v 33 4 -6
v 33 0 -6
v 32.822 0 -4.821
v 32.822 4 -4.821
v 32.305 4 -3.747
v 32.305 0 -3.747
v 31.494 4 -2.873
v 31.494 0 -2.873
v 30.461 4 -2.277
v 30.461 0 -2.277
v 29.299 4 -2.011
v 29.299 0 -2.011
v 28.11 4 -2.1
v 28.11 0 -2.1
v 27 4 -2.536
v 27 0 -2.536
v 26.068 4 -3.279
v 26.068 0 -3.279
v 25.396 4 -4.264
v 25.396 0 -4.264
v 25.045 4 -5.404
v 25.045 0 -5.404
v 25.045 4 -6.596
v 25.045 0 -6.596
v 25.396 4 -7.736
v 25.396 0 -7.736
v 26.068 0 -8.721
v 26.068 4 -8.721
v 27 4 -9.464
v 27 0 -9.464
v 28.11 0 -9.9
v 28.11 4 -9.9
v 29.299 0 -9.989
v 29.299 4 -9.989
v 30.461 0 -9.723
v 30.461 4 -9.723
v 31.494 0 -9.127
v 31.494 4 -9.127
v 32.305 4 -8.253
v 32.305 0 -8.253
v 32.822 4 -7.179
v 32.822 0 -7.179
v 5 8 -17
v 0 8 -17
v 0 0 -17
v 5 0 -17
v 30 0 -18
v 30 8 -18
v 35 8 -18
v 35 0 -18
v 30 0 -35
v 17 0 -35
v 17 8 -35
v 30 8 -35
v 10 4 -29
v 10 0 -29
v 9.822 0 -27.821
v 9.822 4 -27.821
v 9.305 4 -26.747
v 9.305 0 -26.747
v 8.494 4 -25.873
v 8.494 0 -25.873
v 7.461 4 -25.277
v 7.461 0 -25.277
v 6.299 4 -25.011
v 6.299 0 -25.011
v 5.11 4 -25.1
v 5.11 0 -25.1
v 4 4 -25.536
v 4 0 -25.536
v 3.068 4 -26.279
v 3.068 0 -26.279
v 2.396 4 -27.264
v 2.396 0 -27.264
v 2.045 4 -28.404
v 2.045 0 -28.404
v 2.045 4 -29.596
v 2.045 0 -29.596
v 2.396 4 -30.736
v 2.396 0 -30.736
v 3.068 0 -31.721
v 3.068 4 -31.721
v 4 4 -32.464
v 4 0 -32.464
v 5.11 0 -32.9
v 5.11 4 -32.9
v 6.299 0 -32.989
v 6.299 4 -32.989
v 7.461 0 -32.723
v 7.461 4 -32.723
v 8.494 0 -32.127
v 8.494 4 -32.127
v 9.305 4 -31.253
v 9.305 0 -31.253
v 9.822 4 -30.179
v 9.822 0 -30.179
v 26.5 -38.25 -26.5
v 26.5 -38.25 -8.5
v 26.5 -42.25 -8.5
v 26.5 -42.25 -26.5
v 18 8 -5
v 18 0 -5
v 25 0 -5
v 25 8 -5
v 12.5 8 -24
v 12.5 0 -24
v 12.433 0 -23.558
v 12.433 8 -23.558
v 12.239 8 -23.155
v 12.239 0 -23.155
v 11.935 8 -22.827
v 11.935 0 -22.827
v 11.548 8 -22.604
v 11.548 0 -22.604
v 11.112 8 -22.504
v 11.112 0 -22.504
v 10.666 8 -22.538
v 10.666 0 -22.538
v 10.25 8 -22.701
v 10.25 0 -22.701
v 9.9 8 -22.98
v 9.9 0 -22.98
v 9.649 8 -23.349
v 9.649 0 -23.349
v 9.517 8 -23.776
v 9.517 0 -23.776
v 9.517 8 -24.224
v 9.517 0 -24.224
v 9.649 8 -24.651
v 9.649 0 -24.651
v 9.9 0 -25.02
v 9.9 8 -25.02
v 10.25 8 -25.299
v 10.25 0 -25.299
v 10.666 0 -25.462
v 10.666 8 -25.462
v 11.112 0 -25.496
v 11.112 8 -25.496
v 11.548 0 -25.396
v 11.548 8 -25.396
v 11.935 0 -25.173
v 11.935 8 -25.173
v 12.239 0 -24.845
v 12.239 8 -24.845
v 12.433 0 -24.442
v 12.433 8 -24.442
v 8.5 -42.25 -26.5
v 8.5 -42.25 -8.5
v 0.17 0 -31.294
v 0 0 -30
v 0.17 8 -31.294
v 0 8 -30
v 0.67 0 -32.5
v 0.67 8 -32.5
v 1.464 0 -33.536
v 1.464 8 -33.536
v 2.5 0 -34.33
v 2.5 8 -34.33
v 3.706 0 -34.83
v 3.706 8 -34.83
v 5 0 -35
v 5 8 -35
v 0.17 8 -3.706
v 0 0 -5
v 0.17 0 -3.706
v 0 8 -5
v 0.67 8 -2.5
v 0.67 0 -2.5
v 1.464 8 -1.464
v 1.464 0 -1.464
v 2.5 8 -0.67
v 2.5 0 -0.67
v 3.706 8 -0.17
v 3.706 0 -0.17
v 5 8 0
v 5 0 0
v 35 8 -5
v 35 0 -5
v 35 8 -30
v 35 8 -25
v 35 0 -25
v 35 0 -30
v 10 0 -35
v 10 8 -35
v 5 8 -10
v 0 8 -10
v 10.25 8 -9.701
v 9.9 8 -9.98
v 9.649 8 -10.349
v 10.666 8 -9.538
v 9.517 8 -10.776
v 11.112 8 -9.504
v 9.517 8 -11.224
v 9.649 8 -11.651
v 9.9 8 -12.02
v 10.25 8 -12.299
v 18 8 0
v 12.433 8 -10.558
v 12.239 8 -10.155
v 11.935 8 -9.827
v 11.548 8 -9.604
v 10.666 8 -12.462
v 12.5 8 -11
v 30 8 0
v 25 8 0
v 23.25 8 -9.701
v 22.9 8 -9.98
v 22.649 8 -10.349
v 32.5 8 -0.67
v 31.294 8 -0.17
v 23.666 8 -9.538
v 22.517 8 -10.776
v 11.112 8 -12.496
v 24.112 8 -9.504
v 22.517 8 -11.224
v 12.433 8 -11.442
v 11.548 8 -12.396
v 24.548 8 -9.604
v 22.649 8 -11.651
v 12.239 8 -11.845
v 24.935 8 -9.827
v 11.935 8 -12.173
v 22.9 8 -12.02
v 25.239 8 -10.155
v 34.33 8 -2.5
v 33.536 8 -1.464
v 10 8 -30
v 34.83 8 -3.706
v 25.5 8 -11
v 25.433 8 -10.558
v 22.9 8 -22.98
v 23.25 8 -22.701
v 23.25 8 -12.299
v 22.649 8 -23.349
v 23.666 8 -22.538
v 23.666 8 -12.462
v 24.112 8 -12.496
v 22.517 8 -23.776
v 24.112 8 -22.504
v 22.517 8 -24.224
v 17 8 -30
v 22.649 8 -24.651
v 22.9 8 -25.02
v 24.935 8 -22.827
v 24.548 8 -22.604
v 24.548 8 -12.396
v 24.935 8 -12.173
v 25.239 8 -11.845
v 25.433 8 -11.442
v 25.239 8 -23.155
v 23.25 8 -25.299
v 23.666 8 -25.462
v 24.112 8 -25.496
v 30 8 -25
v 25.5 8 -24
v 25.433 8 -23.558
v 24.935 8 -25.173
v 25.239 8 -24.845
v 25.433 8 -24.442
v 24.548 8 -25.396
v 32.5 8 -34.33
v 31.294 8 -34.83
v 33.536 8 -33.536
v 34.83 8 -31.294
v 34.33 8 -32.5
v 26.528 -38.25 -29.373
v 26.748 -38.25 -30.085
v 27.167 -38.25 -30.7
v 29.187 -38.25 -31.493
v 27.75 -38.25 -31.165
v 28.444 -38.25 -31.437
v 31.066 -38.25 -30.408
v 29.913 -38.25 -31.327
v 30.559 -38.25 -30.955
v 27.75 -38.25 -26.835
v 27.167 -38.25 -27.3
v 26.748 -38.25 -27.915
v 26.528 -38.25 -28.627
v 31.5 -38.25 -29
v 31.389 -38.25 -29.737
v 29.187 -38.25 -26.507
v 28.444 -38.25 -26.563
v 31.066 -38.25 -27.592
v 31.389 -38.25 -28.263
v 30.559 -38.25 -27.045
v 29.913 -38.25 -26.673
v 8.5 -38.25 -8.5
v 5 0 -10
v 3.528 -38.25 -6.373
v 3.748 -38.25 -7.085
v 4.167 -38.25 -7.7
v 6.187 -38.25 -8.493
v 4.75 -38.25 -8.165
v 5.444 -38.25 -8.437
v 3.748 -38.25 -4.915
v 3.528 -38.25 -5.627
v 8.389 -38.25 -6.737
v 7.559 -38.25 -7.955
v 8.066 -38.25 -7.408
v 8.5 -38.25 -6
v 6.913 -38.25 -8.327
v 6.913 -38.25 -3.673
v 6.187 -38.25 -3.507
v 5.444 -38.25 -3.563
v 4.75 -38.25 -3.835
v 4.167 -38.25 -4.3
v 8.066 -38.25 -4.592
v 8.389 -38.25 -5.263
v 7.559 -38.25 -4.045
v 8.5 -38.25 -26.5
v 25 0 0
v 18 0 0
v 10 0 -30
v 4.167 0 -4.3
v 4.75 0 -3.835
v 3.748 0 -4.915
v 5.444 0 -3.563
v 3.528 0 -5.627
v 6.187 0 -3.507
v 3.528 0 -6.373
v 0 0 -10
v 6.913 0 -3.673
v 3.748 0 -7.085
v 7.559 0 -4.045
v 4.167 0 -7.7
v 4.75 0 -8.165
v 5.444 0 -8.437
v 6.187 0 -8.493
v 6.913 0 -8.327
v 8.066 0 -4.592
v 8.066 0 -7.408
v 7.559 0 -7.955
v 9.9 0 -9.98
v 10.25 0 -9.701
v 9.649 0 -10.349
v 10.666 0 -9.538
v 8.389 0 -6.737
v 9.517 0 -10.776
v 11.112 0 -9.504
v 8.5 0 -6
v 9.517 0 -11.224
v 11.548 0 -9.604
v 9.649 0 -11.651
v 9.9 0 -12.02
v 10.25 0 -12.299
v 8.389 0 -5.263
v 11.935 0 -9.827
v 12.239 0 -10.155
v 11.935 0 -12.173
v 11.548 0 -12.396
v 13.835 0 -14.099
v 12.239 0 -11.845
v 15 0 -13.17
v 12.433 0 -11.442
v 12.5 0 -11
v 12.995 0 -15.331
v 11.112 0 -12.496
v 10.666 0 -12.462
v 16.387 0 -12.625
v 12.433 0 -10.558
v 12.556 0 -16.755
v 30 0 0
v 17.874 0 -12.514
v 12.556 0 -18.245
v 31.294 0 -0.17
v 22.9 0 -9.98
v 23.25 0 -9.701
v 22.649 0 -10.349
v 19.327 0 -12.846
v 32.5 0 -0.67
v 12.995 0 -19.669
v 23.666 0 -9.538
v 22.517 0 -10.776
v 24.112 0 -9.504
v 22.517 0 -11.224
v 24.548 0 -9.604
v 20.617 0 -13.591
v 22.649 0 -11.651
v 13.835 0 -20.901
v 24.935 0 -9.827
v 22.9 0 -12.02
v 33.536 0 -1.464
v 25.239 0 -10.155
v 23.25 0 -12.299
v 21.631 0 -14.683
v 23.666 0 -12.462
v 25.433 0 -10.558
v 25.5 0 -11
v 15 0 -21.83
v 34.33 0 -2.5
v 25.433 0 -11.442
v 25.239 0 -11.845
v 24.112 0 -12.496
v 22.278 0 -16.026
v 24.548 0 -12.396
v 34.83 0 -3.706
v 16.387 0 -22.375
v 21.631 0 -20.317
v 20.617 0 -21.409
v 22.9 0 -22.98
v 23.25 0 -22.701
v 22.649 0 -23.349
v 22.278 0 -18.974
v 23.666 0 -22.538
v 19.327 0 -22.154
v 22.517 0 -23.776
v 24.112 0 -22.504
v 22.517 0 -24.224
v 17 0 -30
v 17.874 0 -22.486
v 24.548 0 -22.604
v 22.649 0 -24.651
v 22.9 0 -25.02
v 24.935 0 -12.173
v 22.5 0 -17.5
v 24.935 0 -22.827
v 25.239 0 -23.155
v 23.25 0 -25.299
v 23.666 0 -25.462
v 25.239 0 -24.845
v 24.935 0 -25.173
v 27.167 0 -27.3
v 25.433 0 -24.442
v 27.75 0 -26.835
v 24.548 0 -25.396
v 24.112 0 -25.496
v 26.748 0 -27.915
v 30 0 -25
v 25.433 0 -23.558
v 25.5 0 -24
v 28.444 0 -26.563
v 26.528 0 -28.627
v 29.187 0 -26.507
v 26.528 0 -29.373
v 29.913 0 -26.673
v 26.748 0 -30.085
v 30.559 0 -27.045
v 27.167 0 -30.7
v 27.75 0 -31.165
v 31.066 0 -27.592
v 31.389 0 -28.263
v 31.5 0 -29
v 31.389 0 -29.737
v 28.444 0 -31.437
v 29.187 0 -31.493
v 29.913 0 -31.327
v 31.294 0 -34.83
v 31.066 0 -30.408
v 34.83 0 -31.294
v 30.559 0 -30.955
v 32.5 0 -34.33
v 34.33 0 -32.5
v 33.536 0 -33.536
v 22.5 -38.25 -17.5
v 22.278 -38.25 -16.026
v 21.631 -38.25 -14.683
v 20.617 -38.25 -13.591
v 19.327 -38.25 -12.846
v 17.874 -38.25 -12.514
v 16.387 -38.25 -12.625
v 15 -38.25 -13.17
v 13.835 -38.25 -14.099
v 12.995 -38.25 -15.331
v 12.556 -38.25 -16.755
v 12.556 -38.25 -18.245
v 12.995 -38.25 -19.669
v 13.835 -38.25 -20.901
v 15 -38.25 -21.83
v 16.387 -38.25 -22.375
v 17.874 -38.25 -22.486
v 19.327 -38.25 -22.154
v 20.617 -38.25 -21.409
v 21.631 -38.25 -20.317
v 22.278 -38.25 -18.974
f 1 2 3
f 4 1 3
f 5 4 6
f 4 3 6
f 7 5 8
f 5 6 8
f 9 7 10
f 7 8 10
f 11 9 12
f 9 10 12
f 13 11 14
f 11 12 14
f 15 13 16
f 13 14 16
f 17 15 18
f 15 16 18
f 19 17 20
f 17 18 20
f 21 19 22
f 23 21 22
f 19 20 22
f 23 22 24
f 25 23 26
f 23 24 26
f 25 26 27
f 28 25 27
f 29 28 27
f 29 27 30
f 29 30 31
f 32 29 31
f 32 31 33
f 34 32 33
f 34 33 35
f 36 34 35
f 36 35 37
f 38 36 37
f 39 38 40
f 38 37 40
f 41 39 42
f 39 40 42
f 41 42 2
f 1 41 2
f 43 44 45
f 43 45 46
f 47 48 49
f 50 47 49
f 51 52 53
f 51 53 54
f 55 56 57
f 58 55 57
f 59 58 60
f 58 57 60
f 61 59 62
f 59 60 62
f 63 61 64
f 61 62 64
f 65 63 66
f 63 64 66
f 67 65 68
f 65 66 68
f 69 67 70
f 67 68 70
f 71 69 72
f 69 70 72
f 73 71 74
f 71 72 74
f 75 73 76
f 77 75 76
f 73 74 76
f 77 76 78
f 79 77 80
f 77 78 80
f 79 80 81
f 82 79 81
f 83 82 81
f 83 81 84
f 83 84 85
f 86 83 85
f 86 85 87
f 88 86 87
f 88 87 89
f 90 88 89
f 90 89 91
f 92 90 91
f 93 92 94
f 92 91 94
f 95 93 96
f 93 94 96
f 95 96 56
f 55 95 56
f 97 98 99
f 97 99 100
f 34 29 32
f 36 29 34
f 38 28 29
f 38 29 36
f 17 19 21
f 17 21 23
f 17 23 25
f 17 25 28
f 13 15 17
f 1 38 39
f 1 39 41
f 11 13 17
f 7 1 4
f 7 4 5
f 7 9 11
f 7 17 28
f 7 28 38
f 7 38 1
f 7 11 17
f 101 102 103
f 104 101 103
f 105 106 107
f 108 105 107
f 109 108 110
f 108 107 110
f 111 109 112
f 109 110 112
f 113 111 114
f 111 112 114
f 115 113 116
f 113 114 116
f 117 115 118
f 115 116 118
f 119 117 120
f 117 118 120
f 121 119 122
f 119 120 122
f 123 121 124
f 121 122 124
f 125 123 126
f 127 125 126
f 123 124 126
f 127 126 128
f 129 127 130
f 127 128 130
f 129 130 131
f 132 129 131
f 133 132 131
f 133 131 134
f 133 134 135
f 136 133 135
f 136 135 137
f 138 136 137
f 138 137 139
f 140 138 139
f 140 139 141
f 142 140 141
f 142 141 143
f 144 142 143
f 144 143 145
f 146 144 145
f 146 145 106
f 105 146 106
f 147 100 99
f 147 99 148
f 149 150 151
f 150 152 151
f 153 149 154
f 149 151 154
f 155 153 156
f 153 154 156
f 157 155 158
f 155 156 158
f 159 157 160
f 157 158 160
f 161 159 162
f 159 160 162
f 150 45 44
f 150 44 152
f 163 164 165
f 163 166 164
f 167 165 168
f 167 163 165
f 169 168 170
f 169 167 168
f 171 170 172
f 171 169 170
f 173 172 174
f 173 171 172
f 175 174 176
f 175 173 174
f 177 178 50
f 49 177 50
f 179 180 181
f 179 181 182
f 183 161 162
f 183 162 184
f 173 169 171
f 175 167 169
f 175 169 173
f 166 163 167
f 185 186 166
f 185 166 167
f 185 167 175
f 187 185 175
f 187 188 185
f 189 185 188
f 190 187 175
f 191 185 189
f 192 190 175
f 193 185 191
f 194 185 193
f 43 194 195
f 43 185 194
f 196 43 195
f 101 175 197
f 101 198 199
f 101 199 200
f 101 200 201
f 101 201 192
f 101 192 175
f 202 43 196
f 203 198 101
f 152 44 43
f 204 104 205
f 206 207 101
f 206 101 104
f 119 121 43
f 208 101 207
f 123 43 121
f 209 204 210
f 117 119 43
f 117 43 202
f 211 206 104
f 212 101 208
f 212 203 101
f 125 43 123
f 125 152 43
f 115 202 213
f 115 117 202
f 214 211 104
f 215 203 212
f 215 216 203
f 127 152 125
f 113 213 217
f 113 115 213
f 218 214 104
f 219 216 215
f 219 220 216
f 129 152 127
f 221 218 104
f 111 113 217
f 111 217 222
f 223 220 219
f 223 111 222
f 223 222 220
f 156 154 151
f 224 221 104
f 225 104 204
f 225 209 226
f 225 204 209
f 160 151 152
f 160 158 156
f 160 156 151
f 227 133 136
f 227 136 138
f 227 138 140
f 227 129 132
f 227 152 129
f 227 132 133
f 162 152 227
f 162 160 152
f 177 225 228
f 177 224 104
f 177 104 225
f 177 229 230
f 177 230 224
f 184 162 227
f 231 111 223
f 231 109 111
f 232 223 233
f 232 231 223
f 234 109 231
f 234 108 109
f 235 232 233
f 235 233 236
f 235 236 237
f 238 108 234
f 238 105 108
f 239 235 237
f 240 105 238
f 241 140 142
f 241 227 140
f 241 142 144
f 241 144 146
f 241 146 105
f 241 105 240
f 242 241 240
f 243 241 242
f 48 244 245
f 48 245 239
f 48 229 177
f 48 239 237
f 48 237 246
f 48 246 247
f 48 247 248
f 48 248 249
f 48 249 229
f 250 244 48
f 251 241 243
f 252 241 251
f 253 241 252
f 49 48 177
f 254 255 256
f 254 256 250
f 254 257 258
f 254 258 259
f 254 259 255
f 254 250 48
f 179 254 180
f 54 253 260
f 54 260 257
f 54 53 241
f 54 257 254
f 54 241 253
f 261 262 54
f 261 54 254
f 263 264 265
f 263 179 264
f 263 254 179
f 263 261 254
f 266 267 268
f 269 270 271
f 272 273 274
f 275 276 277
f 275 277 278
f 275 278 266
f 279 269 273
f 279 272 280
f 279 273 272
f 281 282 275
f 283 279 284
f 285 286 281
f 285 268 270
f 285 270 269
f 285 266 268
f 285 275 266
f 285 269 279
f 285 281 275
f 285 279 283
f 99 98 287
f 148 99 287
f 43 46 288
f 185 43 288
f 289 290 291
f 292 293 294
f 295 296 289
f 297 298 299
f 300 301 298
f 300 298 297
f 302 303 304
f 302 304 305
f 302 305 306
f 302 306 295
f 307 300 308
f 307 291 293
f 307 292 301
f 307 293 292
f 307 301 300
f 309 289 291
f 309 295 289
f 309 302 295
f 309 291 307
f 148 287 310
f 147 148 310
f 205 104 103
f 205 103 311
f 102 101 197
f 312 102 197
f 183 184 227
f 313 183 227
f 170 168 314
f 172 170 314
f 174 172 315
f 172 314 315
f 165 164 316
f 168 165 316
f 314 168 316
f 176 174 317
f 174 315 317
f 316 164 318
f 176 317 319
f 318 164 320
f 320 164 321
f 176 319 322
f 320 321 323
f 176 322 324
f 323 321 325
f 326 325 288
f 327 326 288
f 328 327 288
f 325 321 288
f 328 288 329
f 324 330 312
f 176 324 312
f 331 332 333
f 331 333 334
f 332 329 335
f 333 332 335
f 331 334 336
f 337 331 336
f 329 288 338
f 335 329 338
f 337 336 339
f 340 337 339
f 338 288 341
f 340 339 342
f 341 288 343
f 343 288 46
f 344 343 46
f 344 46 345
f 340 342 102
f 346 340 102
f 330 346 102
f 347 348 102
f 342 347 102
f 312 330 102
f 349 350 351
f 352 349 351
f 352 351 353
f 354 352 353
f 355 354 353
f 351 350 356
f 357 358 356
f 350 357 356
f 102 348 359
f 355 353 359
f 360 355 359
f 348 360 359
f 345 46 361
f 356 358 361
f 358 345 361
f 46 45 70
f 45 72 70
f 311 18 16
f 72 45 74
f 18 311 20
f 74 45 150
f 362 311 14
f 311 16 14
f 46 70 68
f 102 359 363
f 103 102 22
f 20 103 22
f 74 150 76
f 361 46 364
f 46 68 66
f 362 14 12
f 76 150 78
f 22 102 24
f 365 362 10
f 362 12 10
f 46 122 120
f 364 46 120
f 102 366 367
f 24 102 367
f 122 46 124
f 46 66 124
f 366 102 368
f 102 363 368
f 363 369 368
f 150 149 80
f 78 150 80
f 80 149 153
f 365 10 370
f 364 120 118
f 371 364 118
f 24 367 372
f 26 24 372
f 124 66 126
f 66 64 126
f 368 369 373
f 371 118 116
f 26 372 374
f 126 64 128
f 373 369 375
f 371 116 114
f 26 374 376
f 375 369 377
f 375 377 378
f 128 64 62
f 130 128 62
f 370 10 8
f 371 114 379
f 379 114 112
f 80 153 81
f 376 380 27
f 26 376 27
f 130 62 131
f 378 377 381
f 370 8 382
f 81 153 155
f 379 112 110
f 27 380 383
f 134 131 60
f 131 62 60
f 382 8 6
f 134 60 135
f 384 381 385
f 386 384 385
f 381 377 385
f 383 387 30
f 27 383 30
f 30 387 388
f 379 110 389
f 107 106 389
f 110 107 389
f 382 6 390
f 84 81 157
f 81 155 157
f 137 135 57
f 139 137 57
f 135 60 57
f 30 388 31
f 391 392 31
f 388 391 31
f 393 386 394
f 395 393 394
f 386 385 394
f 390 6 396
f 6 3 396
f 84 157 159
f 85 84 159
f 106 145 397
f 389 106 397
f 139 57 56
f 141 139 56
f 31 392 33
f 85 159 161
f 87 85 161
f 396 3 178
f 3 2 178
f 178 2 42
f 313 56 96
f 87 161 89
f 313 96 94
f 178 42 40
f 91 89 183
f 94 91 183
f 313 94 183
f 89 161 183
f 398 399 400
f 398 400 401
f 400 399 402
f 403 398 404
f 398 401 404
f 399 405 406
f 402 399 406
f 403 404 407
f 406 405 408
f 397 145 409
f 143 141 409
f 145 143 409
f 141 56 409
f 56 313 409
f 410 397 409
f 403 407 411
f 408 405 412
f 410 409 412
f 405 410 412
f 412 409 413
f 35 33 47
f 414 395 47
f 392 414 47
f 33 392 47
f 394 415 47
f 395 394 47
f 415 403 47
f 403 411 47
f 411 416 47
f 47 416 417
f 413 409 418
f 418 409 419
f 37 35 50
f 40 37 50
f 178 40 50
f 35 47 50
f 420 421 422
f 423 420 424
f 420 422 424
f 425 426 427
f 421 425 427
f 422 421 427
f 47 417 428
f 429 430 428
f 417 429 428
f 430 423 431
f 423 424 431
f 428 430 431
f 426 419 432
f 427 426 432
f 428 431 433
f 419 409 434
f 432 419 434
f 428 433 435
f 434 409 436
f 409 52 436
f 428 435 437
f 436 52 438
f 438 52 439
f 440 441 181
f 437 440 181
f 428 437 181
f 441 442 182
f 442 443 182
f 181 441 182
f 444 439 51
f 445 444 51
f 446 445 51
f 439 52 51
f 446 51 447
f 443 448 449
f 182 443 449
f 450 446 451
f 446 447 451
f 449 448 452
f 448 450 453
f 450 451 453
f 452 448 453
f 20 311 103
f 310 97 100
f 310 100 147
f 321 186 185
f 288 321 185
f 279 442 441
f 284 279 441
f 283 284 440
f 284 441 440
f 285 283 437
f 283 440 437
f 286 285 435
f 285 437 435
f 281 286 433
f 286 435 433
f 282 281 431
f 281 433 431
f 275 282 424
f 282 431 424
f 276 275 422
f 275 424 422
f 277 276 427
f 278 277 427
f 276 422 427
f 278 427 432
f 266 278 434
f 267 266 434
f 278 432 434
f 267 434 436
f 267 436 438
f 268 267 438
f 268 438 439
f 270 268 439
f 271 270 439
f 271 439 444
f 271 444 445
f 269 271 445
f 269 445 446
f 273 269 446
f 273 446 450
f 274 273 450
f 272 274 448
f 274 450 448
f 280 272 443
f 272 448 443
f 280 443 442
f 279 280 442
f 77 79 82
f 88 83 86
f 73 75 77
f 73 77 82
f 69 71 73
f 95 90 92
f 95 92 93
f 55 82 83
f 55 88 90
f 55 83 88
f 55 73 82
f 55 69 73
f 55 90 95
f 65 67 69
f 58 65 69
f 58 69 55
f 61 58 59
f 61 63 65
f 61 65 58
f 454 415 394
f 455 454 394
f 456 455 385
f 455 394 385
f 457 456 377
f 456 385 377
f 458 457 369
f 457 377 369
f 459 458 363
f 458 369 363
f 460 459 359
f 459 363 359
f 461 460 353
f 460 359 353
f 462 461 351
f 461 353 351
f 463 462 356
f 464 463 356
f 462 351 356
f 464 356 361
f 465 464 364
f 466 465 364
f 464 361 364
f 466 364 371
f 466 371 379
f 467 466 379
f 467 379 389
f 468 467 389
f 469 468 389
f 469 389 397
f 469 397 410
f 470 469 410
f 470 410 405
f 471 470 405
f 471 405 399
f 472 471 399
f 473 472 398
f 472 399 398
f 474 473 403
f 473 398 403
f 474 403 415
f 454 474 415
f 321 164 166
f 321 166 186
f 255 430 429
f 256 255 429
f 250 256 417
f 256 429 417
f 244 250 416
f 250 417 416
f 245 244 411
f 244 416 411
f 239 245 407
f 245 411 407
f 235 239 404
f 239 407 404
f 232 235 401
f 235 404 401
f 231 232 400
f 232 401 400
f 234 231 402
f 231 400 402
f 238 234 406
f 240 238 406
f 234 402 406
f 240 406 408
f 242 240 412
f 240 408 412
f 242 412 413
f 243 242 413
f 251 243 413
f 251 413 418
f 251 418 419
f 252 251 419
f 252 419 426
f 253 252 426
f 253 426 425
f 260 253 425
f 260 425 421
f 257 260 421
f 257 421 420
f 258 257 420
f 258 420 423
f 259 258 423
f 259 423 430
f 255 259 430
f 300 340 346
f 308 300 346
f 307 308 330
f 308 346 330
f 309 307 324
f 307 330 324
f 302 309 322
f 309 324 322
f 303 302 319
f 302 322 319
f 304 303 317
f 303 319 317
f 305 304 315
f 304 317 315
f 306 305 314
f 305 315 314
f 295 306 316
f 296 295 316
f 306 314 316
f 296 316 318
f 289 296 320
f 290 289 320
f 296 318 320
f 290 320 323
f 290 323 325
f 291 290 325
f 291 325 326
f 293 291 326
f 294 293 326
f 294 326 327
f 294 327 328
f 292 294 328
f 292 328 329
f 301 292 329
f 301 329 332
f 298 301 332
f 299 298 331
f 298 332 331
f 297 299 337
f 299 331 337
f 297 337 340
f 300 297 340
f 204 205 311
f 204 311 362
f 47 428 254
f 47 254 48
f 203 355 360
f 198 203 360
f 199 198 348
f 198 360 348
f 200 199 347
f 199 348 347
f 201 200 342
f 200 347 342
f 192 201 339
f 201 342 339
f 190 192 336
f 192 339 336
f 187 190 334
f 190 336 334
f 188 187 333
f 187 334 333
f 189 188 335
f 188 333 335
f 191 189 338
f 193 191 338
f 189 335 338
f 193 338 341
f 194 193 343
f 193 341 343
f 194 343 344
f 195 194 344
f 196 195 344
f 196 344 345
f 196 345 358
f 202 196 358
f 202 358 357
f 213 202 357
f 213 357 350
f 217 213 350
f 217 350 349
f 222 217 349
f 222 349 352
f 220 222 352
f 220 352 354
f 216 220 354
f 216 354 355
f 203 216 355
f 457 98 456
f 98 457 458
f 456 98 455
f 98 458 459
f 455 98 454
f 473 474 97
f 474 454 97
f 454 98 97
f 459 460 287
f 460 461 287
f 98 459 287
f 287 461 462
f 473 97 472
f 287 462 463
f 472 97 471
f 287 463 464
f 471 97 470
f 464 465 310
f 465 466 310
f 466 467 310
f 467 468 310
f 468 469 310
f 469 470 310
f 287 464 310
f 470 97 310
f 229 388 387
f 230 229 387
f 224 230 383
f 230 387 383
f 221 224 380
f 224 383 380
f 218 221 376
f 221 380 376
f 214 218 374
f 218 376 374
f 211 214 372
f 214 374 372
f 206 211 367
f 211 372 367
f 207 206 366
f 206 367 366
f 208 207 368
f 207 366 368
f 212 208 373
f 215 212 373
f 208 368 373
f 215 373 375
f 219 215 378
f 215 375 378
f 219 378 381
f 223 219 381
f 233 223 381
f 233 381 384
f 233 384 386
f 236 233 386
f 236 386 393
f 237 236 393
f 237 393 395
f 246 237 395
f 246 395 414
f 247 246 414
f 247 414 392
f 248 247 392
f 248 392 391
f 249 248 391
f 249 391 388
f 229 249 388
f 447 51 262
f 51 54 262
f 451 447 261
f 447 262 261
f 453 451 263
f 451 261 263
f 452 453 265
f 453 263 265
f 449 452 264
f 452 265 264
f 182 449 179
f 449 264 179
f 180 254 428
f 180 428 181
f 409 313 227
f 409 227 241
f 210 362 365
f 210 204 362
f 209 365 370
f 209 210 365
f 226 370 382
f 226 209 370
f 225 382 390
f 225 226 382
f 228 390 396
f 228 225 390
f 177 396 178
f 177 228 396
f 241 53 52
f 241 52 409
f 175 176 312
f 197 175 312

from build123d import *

# Parameters (mm, degrees)
SKETCH1_W           = 35
SKETCH1_H           = 35
BOSS_EXTRUDE1_DEPTH = 8
SKETCH2_W           = 7
SKETCH2_H           = 5
SKETCH2_W_2         = 5
SKETCH2_H_2         = 7
SKETCH2_R           = 1.5
CUT_EXTRUDE1_DEPTH  = 51.139804547
SKETCH2_5_R         = 4
SKETCH2_5_R_2       = 1.5
CUT_EXTRUDE2_DEPTH  = 4
SKETCH2_7_R         = 2.5
SKETCH2_7_R_2       = 5
BOSS_EXTRUDE2_DEPTH = 38.25
SKETCH3_W           = 18
SKETCH3_H           = 18
BOSS_EXTRUDE3_DEPTH = 4
FILLET1_R           = 5


with BuildPart() as part:
    # Sketch1 → Boss-Extrude1 (new body)
    with BuildSketch(Plane(origin=(0, 0, 0), x_dir=(1, 0, 0), z_dir=(0, 1, 0))):
        with Locations((17.5, 17.5)):
            Rectangle(SKETCH1_W, SKETCH1_H)
    extrude(amount=BOSS_EXTRUDE1_DEPTH)

    # Sketch2 → Cut-Extrude1 (cut, through all)
    with BuildSketch(Plane.XZ):
        with Locations((21.5, -2.5)):
            Rectangle(SKETCH2_W, SKETCH2_H)
        with Locations((2.5, -13.5)):
            Rectangle(SKETCH2_W_2, SKETCH2_H_2)
        with Locations((32.5, -21.5)):
            Rectangle(SKETCH2_W_2, SKETCH2_H_2)
        with Locations((13.5, -32.5)):
            Rectangle(SKETCH2_W, SKETCH2_H)
        with Locations((11, -11)):
            Circle(SKETCH2_R)
        with Locations((24, -11)):
            Circle(SKETCH2_R)
        with Locations((24, -24)):
            Circle(SKETCH2_R)
        with Locations((11, -24)):
            Circle(SKETCH2_R)
    extrude(amount=-CUT_EXTRUDE1_DEPTH, mode=Mode.SUBTRACT)

    # Sketch2<5> → Cut-Extrude2 (cut)
    with BuildSketch(Plane.XZ):
        with Locations((29, -6)):
            Circle(SKETCH2_5_R)
        with Locations((6, -29)):
            Circle(SKETCH2_5_R)
        with Locations((11, -11)):
            Circle(SKETCH2_5_R_2)
    extrude(amount=-CUT_EXTRUDE2_DEPTH, mode=Mode.SUBTRACT)

    # Sketch2<7> → Boss-Extrude2 (add)
    with BuildSketch(Plane.XZ):
        with Locations((6, -6)):
            Circle(SKETCH2_7_R)
        with Locations((29, -29)):
            Circle(SKETCH2_7_R)
        with Locations((17.5, -17.5)):
            Circle(SKETCH2_7_R_2)
    extrude(amount=BOSS_EXTRUDE2_DEPTH)

    # Sketch3 → Boss-Extrude3 (add)
    with BuildSketch(Plane(origin=(0, -38.25, 0), x_dir=(-1, 0, 0), z_dir=(0, -1, 0))):
        with Locations((-17.5, 17.5)):
            Rectangle(SKETCH3_W, SKETCH3_H)
    extrude(amount=BOSS_EXTRUDE3_DEPTH)

    # Fillet1
    fillet1_edges = [part.edges().sort_by_distance(p)[0] for p in [
        (35, 4, -35),
        (0, 4, -35),
        (0, 4, 0),
        (35, 4, 0),
    ]]
    fillet(fillet1_edges, radius=FILLET1_R)


solid = part.part
